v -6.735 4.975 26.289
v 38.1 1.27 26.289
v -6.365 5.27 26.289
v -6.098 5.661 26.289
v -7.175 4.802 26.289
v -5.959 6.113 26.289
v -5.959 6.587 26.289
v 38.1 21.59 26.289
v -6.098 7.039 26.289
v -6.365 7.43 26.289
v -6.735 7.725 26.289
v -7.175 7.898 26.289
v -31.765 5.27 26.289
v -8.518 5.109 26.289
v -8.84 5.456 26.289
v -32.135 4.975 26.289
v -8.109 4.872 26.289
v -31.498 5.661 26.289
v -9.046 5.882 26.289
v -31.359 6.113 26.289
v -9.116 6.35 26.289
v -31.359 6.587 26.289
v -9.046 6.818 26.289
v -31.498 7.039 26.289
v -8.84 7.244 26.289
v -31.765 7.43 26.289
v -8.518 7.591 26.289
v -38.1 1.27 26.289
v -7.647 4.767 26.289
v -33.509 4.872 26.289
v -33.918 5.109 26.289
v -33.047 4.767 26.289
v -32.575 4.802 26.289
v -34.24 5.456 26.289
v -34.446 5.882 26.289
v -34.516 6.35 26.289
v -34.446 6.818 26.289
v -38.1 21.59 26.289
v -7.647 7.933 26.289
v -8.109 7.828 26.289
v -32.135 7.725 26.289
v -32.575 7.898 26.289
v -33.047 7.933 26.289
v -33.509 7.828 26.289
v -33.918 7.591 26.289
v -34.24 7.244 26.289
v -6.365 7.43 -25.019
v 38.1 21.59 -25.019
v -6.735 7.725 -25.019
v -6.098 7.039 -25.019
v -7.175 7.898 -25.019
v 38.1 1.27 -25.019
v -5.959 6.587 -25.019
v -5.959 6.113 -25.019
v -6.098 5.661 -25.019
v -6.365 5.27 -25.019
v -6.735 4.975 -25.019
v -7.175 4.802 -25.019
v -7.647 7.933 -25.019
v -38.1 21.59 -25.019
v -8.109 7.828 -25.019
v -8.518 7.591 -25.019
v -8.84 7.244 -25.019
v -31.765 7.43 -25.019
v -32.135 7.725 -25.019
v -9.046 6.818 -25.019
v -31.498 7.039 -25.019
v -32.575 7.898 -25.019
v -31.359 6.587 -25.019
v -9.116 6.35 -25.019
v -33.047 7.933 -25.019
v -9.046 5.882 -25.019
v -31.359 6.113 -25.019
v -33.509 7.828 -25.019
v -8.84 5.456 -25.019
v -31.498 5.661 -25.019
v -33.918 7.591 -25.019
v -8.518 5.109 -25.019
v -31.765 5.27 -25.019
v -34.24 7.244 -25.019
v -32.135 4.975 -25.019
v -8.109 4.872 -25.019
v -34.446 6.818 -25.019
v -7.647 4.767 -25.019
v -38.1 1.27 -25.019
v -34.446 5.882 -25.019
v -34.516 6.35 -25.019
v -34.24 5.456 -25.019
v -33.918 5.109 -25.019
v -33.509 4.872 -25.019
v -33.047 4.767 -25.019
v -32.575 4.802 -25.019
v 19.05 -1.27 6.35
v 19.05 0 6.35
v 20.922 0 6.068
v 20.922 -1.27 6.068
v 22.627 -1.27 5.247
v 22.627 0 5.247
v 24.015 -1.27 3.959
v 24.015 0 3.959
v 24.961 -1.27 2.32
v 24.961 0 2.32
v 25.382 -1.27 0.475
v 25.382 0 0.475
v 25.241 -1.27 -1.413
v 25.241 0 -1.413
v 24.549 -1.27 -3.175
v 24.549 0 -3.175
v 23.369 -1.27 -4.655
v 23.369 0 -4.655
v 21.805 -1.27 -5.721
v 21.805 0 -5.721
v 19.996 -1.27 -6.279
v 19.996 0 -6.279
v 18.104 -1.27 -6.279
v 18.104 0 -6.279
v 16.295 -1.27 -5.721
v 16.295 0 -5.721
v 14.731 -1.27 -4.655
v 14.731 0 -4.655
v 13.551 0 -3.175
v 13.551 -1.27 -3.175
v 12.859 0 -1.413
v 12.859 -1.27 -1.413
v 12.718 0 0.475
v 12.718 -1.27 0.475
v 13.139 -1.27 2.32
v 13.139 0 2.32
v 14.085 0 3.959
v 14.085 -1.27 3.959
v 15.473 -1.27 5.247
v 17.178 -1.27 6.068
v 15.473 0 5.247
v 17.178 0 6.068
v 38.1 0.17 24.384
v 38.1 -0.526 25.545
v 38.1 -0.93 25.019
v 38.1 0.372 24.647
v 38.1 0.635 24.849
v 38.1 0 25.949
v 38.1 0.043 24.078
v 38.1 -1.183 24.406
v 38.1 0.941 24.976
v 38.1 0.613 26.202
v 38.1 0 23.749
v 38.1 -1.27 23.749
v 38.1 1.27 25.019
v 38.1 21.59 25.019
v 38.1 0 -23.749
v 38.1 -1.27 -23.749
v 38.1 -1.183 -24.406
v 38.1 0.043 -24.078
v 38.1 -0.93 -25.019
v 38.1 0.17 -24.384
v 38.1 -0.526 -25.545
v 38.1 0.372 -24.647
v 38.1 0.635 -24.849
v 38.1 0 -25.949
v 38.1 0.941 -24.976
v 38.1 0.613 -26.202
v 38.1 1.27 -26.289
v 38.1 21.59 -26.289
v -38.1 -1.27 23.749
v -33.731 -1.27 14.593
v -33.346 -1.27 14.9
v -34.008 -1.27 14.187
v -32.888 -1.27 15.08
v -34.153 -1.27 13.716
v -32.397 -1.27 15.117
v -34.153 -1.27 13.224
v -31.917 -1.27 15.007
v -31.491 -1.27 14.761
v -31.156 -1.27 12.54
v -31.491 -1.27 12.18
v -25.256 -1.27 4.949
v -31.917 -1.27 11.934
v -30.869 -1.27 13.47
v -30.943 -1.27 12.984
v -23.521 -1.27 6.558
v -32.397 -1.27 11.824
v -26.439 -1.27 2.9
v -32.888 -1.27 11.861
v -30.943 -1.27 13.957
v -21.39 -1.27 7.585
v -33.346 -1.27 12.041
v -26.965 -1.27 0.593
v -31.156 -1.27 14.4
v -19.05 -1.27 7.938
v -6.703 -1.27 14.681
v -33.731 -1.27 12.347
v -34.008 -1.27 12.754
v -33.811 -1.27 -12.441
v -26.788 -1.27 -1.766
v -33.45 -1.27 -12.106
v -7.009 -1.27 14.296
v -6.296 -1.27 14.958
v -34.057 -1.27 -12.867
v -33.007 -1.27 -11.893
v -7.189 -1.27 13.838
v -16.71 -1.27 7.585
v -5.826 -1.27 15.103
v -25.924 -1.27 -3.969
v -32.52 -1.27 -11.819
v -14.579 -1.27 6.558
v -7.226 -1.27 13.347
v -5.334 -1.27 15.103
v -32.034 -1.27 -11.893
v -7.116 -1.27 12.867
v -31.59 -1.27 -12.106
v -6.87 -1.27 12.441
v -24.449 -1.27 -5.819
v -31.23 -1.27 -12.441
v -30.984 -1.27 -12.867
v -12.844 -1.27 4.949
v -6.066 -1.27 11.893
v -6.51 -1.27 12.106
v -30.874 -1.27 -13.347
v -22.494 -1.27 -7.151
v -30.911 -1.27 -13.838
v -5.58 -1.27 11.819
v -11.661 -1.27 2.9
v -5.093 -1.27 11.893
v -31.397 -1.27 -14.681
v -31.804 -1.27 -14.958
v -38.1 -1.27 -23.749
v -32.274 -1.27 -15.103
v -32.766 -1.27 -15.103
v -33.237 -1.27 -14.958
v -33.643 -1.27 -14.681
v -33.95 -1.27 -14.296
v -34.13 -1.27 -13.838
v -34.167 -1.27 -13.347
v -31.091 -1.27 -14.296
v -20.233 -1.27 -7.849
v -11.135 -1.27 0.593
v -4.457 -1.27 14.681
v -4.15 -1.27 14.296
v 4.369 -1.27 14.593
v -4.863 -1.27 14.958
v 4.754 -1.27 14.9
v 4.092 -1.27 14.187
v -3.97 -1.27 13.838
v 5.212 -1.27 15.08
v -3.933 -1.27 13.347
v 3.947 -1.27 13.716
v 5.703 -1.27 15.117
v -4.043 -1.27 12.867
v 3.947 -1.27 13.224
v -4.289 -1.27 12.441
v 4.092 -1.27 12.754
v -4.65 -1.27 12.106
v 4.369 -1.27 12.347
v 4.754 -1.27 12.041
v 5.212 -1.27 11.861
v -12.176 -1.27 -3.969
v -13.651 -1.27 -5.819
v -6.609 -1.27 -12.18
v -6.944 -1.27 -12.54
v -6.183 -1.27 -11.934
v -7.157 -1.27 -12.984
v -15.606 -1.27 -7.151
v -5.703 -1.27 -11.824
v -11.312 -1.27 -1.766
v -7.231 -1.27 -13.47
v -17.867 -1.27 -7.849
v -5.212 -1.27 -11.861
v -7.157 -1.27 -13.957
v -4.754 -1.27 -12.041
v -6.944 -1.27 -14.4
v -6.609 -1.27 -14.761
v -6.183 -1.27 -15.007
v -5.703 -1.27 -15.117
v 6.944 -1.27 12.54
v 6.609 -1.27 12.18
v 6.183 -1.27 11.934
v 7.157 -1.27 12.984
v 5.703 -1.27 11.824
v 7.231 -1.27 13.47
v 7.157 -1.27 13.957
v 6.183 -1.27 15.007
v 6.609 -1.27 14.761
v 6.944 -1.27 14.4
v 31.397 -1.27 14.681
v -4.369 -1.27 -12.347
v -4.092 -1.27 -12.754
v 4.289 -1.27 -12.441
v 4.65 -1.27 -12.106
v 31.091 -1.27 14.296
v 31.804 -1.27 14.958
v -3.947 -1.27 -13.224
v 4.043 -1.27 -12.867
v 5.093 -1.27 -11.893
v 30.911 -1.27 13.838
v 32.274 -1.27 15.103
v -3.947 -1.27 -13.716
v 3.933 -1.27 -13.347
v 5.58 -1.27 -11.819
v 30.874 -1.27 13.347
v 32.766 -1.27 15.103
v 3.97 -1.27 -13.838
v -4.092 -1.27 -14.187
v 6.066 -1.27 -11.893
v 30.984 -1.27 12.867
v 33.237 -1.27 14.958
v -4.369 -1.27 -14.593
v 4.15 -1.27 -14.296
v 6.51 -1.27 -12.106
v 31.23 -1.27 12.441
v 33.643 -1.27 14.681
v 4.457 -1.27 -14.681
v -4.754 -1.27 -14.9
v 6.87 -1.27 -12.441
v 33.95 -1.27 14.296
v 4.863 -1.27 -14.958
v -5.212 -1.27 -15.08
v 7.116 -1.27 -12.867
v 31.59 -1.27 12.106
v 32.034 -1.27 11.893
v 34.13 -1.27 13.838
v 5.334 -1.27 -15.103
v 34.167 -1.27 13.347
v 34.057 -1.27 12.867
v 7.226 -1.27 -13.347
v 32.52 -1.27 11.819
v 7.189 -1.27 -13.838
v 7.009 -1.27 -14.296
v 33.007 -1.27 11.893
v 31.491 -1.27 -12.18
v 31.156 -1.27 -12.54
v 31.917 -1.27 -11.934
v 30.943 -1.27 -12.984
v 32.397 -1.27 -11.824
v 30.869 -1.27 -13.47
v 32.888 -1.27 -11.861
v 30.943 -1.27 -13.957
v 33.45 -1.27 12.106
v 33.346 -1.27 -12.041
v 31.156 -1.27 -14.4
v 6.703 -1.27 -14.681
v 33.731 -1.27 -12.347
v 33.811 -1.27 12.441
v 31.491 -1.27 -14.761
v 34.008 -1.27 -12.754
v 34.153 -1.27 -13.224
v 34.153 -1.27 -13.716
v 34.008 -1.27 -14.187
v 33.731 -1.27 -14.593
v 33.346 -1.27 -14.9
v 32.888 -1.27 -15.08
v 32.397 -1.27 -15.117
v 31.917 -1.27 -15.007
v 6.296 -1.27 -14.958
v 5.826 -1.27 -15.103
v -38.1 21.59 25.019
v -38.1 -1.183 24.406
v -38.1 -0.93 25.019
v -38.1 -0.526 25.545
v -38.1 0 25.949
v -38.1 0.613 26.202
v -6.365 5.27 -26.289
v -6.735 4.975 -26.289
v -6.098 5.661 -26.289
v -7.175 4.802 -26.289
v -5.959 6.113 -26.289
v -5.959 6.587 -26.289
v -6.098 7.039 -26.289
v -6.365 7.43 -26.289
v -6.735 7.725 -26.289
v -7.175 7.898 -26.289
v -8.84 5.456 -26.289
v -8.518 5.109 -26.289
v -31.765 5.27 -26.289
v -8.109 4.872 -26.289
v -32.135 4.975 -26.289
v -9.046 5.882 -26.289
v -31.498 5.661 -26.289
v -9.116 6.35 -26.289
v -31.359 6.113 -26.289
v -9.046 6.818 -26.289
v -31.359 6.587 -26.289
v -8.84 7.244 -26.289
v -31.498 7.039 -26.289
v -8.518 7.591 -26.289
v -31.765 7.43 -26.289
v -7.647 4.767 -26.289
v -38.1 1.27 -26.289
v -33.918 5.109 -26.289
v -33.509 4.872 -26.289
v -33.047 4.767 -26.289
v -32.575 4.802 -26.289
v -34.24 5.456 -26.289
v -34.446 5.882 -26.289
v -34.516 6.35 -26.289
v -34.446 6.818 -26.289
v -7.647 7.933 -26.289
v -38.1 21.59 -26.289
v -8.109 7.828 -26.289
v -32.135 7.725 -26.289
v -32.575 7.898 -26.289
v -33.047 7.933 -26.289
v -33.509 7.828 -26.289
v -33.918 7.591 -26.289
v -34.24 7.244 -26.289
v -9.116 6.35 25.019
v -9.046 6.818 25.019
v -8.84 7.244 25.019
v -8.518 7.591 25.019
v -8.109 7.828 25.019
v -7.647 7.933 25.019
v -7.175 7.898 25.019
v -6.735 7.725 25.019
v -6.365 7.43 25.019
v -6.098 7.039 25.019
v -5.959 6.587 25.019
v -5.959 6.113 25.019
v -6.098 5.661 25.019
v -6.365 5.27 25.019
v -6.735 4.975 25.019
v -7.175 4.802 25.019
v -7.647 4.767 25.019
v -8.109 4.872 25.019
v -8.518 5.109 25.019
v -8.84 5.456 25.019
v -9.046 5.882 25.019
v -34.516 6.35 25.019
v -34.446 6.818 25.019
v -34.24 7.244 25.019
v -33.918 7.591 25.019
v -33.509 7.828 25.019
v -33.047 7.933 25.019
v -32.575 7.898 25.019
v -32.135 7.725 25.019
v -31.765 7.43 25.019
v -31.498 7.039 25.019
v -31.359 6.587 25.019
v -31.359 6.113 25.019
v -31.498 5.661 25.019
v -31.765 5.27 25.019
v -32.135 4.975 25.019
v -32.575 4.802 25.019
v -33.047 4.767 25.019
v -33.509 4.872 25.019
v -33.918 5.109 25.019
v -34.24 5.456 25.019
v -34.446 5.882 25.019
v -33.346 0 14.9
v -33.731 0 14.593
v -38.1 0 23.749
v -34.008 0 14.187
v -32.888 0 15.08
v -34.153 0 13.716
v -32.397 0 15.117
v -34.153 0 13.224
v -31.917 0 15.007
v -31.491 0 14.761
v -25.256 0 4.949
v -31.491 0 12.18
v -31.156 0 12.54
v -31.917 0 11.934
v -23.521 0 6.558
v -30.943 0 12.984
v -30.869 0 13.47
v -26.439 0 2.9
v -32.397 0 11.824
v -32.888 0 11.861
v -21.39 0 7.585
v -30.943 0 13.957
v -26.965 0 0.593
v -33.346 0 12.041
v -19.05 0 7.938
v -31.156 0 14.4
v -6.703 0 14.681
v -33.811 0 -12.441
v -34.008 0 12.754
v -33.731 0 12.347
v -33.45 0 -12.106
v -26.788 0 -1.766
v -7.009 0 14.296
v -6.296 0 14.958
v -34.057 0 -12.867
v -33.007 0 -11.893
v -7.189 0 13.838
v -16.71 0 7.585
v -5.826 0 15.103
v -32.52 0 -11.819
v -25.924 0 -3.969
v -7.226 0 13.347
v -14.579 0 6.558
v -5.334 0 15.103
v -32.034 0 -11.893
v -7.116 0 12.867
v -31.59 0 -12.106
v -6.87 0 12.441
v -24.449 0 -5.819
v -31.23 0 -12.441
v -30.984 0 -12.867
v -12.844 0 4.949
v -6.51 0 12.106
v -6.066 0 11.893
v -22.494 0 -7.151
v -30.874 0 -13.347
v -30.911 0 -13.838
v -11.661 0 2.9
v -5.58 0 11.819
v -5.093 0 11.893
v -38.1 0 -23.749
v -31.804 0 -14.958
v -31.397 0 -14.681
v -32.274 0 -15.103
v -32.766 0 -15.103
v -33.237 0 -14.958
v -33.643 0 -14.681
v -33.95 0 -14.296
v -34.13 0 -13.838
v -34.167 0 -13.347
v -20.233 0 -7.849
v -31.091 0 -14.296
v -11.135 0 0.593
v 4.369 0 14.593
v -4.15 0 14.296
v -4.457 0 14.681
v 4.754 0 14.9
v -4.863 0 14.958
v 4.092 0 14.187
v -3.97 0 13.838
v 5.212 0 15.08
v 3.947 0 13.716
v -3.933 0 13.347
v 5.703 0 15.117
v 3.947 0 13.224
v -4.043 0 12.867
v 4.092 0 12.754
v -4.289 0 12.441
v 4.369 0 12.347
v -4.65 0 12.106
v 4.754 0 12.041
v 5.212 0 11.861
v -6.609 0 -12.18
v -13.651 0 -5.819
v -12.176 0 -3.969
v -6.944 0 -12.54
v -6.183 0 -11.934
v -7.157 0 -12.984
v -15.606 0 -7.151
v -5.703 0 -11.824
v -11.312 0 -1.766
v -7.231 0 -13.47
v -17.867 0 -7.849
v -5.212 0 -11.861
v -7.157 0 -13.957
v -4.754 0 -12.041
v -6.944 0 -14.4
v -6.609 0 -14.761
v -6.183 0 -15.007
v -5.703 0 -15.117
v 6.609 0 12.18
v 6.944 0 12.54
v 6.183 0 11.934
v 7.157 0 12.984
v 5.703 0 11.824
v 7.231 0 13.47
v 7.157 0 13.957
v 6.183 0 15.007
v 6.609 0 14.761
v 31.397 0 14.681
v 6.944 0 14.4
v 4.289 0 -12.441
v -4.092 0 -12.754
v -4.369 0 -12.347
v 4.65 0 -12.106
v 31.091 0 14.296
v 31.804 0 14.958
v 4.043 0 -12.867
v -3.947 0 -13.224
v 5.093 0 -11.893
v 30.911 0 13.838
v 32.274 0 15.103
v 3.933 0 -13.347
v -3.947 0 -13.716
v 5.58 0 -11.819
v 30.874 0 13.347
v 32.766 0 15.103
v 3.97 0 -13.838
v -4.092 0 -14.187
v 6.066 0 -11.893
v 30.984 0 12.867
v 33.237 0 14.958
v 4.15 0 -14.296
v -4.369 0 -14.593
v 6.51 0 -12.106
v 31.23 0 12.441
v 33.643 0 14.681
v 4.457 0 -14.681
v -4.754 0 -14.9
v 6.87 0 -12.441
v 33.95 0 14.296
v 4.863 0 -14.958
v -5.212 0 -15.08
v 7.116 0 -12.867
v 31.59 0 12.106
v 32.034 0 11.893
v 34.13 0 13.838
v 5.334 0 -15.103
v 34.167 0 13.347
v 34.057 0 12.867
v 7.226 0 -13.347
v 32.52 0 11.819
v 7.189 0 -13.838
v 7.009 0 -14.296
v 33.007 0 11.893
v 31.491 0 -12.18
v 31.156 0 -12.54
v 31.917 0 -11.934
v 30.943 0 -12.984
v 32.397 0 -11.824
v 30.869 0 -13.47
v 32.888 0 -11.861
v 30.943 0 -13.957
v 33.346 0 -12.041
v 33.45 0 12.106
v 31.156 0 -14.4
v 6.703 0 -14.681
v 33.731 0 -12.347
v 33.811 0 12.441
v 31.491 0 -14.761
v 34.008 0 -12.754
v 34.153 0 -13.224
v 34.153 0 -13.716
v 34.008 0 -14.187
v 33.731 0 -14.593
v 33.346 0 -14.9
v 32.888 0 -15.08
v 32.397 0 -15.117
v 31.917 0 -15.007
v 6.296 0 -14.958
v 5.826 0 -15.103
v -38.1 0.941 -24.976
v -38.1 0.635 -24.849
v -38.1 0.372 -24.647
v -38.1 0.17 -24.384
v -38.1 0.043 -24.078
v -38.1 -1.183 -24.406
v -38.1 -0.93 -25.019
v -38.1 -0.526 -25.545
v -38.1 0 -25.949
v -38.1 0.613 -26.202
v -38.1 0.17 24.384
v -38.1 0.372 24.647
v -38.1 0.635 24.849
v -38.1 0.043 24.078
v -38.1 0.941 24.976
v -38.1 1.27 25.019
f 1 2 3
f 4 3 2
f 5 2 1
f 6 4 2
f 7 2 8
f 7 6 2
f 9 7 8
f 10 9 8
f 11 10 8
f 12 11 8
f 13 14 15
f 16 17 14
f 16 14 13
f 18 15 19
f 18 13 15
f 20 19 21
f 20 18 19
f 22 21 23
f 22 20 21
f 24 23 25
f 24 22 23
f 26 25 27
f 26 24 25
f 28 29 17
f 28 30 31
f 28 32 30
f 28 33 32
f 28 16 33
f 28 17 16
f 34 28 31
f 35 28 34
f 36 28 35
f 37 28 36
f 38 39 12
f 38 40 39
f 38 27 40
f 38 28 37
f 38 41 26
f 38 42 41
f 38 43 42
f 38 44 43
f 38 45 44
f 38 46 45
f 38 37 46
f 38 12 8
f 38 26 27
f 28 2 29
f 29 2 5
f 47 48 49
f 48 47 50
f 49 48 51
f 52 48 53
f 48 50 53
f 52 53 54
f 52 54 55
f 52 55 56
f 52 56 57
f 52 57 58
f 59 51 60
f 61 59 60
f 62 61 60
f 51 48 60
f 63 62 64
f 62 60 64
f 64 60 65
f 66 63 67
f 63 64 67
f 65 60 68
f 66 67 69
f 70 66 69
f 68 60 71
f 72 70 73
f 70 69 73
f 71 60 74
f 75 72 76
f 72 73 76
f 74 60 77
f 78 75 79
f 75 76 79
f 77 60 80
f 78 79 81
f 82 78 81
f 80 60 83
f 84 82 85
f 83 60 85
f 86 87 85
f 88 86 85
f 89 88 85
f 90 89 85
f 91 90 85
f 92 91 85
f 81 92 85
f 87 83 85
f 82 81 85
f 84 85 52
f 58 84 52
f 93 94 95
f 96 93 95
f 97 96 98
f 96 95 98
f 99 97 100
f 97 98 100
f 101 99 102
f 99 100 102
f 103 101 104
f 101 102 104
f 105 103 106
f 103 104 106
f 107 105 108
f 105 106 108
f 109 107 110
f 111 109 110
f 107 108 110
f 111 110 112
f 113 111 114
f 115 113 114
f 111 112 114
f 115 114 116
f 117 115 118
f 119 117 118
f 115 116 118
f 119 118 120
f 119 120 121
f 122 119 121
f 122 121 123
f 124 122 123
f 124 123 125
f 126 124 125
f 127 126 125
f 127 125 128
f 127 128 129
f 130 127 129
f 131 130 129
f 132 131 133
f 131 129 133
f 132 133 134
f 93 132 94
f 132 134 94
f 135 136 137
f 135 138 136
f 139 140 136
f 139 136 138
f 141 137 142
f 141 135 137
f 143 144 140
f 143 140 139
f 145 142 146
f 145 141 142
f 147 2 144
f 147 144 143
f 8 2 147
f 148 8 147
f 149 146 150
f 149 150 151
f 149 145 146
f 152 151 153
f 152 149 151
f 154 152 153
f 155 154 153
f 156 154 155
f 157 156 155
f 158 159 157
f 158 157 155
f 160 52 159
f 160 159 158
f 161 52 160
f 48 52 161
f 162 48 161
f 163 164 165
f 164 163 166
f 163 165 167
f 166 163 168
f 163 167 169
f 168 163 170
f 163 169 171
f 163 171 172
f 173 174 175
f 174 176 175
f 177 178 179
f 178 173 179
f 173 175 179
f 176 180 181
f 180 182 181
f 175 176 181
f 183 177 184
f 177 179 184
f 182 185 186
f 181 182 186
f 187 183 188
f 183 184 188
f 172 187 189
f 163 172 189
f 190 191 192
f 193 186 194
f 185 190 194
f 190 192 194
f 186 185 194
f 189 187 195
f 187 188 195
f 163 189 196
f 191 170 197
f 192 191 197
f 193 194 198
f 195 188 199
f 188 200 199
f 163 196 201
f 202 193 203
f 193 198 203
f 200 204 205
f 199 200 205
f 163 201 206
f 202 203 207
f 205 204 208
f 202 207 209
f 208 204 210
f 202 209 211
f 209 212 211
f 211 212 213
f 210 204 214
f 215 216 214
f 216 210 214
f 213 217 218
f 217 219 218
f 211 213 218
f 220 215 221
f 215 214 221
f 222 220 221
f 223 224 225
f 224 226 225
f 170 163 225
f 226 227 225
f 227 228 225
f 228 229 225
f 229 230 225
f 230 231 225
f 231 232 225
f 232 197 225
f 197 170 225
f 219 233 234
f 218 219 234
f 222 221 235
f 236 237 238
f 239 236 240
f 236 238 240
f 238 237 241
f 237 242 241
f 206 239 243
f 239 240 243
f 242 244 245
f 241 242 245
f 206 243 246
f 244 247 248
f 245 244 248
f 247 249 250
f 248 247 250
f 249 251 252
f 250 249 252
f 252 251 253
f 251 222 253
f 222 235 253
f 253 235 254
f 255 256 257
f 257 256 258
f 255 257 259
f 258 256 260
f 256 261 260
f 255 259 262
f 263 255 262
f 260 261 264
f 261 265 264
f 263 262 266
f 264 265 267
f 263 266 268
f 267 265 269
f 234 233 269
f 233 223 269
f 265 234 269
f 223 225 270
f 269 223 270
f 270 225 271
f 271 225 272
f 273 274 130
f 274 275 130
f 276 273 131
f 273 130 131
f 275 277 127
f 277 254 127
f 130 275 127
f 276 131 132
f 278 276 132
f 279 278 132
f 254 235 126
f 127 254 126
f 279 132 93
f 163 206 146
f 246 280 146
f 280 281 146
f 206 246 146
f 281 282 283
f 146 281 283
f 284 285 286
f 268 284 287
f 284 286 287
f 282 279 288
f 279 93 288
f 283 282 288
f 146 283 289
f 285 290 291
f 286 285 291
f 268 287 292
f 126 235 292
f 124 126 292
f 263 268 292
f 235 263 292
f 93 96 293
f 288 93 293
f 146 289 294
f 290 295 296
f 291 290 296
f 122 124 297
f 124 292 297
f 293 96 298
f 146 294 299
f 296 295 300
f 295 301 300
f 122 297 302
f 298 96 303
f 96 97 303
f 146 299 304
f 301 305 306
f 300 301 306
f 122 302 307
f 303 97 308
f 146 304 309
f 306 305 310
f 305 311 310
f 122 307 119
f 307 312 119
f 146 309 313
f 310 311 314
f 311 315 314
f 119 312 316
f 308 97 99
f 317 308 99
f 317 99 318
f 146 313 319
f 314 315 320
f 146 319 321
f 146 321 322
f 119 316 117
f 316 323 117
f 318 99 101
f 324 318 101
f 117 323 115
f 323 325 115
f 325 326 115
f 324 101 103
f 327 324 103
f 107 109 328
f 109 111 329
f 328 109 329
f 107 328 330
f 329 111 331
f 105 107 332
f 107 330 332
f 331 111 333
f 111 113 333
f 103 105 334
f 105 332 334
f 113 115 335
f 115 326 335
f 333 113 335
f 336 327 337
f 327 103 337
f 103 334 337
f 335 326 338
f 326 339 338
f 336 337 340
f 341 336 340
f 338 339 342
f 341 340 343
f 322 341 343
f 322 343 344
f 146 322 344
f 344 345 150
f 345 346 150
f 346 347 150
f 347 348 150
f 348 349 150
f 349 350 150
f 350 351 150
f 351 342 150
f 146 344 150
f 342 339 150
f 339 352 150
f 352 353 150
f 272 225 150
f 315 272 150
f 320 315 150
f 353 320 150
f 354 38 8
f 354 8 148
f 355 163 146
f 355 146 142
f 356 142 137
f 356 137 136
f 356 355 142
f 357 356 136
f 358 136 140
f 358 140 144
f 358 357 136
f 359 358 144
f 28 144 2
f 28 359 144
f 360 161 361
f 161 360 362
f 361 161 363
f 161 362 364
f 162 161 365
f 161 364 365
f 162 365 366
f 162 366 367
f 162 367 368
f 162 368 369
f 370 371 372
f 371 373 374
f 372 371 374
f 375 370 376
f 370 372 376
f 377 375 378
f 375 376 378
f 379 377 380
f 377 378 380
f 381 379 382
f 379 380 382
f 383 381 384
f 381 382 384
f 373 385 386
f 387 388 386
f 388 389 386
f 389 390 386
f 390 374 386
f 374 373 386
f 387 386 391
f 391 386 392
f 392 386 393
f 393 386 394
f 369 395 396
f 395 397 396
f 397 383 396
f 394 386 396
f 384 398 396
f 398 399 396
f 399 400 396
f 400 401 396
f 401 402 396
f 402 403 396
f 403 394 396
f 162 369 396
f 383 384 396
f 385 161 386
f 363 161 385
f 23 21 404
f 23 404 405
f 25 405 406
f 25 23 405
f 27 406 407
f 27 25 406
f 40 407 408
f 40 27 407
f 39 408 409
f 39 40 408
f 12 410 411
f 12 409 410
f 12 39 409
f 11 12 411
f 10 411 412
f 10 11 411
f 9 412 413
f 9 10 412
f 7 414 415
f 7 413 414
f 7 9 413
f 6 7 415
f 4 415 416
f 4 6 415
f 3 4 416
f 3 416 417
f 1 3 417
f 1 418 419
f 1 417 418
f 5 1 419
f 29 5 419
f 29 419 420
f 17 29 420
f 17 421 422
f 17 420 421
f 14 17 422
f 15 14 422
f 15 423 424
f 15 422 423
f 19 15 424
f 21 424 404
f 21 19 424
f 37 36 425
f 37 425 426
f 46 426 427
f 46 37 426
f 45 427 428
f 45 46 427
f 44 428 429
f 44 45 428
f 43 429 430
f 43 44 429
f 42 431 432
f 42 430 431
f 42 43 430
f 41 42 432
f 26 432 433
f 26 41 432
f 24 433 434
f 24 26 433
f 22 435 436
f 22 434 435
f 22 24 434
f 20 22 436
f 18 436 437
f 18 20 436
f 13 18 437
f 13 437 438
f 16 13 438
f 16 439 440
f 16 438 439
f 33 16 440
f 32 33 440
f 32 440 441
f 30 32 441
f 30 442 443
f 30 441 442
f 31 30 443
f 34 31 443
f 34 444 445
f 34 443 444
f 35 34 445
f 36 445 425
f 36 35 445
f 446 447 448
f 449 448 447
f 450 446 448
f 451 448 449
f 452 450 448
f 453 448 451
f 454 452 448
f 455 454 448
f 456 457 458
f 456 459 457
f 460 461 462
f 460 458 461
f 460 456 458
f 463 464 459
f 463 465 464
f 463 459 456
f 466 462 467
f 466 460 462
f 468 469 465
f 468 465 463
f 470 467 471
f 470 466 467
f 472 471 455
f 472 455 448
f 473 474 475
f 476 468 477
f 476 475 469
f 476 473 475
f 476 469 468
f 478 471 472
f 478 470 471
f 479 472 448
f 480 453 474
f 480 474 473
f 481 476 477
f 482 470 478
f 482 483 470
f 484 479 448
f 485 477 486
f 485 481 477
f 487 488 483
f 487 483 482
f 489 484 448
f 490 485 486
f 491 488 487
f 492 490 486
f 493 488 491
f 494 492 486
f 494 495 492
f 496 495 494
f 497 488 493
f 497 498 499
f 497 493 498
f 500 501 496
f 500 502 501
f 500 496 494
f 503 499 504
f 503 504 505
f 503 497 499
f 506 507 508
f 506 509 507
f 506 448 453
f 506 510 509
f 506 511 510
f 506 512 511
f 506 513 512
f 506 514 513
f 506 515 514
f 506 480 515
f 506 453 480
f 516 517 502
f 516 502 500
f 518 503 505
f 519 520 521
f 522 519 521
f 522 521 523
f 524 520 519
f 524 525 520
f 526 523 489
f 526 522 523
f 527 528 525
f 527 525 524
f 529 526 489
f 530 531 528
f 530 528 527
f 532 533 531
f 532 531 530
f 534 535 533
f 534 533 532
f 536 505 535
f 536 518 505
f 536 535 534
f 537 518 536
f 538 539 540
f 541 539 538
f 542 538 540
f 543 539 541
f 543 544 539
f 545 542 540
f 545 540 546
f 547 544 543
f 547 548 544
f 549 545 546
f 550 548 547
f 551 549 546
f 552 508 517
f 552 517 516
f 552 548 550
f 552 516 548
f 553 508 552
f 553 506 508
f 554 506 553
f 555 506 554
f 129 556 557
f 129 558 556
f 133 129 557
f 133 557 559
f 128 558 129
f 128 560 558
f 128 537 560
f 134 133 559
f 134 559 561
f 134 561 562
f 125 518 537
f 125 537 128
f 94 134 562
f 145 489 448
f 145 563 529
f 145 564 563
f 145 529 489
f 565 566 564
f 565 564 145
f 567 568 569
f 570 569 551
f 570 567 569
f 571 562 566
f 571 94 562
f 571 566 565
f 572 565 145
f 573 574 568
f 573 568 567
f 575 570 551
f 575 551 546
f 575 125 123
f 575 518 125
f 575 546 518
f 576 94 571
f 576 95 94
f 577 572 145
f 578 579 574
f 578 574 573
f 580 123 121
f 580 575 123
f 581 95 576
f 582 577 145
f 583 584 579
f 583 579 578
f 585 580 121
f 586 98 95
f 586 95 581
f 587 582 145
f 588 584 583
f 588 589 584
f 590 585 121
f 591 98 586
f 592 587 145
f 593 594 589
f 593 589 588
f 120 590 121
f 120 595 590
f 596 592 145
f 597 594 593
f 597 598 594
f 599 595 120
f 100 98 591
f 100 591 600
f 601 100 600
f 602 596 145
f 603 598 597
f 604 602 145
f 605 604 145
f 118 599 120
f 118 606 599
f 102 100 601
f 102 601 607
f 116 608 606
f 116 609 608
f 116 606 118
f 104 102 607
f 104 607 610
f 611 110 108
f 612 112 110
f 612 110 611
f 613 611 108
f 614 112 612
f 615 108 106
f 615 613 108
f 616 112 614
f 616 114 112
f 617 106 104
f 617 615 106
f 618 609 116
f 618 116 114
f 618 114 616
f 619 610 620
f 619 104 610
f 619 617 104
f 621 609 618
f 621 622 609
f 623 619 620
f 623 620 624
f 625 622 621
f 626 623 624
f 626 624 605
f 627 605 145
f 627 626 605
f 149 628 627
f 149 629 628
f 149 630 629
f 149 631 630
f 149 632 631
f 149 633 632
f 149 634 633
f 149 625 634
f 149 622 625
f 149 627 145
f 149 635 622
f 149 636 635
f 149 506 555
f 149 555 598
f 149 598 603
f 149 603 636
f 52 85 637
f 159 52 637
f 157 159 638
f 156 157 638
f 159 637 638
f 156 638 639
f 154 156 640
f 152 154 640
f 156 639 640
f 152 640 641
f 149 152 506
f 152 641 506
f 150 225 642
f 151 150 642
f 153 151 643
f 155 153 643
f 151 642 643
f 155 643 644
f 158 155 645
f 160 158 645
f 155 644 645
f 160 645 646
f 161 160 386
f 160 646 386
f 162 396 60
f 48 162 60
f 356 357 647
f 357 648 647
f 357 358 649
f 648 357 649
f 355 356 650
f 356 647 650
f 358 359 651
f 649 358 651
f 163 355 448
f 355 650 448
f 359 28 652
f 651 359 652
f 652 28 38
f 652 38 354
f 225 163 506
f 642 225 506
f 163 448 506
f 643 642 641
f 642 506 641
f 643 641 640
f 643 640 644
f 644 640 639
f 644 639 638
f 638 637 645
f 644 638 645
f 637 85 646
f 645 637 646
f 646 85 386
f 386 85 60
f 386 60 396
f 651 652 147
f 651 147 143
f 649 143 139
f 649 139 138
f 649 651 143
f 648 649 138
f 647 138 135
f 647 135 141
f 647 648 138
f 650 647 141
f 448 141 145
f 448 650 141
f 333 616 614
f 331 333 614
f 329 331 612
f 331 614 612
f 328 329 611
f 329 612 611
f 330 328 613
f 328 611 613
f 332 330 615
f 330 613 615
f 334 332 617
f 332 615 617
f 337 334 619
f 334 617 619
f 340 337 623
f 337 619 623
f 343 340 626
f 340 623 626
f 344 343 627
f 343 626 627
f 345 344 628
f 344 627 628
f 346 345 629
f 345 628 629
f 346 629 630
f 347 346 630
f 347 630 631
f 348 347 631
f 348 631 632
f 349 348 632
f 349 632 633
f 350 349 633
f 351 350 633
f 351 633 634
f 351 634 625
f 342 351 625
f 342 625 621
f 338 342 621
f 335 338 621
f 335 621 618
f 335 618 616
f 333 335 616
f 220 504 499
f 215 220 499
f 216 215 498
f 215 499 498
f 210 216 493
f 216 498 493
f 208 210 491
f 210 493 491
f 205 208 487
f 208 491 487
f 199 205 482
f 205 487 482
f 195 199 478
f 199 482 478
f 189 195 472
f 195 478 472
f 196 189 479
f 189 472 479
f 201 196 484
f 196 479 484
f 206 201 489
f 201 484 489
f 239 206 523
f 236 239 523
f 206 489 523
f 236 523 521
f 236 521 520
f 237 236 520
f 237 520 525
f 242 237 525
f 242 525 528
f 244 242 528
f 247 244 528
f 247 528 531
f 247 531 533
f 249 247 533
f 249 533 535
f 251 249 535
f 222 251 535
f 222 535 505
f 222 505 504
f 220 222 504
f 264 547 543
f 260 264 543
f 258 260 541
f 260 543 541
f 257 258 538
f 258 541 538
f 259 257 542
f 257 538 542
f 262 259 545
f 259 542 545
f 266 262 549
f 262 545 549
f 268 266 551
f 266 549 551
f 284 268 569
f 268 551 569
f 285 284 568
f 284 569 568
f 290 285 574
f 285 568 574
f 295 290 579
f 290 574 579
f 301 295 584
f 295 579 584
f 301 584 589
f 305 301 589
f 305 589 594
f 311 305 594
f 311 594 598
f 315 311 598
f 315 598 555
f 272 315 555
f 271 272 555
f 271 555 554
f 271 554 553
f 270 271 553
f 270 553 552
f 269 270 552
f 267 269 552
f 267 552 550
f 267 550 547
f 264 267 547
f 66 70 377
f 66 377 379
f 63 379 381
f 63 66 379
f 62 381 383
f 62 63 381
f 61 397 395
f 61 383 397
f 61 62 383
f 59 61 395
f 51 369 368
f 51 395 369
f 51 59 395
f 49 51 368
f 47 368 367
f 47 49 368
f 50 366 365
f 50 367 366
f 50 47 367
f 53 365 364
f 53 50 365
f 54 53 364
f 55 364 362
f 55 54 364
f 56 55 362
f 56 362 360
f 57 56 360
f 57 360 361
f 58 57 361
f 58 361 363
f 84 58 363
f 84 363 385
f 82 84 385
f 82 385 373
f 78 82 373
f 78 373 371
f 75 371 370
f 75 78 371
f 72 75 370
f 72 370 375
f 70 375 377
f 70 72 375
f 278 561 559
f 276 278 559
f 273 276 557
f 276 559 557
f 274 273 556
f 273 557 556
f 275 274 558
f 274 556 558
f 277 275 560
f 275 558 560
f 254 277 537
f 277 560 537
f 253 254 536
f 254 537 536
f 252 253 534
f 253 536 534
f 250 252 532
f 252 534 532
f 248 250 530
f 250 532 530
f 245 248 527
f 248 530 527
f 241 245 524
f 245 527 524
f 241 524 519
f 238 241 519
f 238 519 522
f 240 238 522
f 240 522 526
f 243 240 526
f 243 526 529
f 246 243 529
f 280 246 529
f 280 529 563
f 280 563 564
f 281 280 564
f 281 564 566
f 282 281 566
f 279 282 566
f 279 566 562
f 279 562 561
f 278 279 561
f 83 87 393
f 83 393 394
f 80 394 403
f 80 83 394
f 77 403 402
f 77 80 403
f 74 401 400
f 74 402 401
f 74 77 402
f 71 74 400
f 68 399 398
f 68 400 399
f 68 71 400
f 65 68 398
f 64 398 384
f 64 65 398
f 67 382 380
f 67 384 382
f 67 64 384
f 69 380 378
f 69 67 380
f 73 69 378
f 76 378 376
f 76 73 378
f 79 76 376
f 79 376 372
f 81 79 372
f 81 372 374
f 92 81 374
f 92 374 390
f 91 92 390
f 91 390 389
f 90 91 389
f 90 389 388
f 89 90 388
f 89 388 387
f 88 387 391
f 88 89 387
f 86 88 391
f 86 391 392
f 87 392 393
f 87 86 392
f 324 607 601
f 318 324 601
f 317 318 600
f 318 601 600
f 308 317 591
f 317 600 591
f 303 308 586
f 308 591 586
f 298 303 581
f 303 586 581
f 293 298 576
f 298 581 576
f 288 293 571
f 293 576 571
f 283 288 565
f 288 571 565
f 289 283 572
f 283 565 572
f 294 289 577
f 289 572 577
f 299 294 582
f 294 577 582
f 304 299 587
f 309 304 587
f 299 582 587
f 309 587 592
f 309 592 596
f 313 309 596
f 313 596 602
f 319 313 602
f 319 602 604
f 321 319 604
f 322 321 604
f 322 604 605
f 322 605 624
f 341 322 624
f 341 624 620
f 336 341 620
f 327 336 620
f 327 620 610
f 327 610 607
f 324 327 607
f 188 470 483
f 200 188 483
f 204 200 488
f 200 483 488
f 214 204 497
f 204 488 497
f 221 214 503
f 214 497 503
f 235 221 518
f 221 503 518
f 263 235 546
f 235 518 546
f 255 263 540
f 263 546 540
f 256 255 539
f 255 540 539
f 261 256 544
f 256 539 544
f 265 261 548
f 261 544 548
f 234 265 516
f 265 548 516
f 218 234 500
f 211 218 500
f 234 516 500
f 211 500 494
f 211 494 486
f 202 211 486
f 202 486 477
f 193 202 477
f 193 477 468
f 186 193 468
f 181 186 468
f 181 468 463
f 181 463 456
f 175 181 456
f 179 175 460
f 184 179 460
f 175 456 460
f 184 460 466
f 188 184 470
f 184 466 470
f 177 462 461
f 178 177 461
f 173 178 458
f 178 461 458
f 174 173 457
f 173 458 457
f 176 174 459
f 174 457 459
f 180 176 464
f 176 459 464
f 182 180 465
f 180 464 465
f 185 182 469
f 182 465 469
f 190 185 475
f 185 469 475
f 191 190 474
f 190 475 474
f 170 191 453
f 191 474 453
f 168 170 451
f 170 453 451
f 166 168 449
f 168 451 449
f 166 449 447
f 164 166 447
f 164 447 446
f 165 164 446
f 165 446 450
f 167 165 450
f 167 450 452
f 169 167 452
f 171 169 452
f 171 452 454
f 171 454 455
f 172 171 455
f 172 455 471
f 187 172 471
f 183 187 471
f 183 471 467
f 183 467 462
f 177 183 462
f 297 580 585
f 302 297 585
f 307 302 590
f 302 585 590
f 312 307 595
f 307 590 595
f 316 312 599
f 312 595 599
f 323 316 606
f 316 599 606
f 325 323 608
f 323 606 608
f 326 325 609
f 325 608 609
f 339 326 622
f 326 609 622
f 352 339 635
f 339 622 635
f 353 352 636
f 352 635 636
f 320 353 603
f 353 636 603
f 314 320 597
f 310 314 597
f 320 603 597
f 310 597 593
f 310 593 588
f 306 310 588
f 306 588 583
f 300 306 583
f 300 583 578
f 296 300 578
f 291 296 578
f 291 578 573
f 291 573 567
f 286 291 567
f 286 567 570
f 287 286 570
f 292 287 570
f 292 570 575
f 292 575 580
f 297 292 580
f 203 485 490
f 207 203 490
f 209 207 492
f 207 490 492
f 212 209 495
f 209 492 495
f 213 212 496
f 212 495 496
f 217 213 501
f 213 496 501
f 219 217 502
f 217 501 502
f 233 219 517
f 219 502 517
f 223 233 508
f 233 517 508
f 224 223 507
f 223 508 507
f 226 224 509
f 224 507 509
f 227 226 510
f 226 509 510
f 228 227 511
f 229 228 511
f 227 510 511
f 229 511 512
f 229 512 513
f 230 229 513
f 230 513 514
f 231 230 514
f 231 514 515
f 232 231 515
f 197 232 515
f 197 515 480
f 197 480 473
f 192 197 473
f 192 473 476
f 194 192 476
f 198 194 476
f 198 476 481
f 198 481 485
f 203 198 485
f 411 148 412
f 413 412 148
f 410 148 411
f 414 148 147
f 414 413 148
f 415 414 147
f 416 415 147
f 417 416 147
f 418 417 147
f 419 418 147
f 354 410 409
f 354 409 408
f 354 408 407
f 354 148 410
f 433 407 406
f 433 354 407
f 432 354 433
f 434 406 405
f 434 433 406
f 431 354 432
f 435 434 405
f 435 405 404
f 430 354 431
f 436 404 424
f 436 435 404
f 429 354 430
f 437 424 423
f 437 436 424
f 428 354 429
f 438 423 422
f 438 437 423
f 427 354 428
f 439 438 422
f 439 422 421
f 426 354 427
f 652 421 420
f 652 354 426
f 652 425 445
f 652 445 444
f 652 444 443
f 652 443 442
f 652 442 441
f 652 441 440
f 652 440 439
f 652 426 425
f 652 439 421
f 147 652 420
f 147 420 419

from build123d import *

# Parameters (mm, degrees)
SKETCH1_W                    = 76.2
SKETCH1_H                    = 50.038
SKETCH1_R                    = 7.9375
BASE_FLANGE1_DEPTH           = 1.27
EDGE_FLANGE1_STRIP_W         = 7.62
EDGE_FLANGE1_STRIP_H         = 1.27
EDGE_FLANGE1_STRIP_CUT_DEPTH = 76.2
EDGE_FLANGE1_DEPTH           = 76.2
SKETCH9_R                    = 1.651
CUT_EXTRUDE3_DEPTH           = 52.076899093
CIRPATTERN2_COUNT            = 4
SKETCH11_R                   = 6.35
SKETCH11_R_2                 = 1.651
CUT_EXTRUDE4_DEPTH           = 2.54
CIRPATTERN3_COUNT            = 4
CUT_EXTRUDE2_DEPTH           = 69.426487445
CUT_EXTRUDE2_DEPTH_BACK      = 69.426487445
SKETCH10_R                   = 1.5875


# Sheet-metal steps are written as plain solids
with BuildPart() as part:
    # Sketch1 → Base-Flange1 (new body)
    with BuildSketch(Plane(origin=(0, 0, 0), x_dir=(1, 0, 0), z_dir=(0, 1, 0))):
        Rectangle(SKETCH1_W, SKETCH1_H)
        with Locations(Location((-19.05, 0, 0), (0, 0, 270))):
            Circle(SKETCH1_R, mode=Mode.SUBTRACT)
    extrude(amount=-BASE_FLANGE1_DEPTH)

    # Edge-Flange1 strip (across the edge) → Edge-Flange1 strip cut (cut)
    with BuildSketch(Plane(origin=(-38.1, 0, 25.019), x_dir=(0, 0, -1), z_dir=(1, 0, 0))):
        with Locations((-2.54, -0.635)):
            Rectangle(EDGE_FLANGE1_STRIP_W, EDGE_FLANGE1_STRIP_H)
    edge_flange1_strip_cut = extrude(amount=EDGE_FLANGE1_STRIP_CUT_DEPTH, mode=Mode.SUBTRACT)

    # Edge-Flange1 section (across the edge) → Edge-Flange1 (add)
    with BuildSketch(Plane(origin=(-38.1, 0, 25.019), x_dir=(0, 0, -1), z_dir=(1, 0, 0))):
        with BuildLine():
            Line((-1.27, 1.27), (-1.27, 21.59))
            Line((-1.27, 21.59), (0, 21.59))
            Line((0, 21.59), (0, 1.27))
            ThreePointArc((0, 1.27), (0.371974388, 0.371974388), (1.27, 0))
            Line((1.27, 0), (1.27, -1.27))
            ThreePointArc((1.27, -1.27), (-0.526051224, -0.526051224), (-1.27, 1.27))
        make_face()
    edge_flange1 = extrude(amount=EDGE_FLANGE1_DEPTH)

    # Mirror1: Edge-Flange1 strip cut, Edge-Flange1 across plane
    add(edge_flange1_strip_cut.mirror(Plane.XY), mode=Mode.SUBTRACT)
    add(edge_flange1.mirror(Plane.XY))

    # Sketch9 → Cut-Extrude3 (cut, through all)
    with BuildSketch(Plane(origin=(0, 0, 0), x_dir=(1, 0, 0), z_dir=(0, 1, 0))):
        with Locations(Location((-32.520384182, 13.470384182, 0), (0, 0, 270))):
            Circle(SKETCH9_R)
    cut_extrude3 = extrude(amount=-CUT_EXTRUDE3_DEPTH, mode=Mode.SUBTRACT)

    # CirPattern2: Cut-Extrude3 ×4 about axis
    cirpattern2_axis = Axis((-19.05, 0, 0), (0, 1, 0))
    for i in range(1, CIRPATTERN2_COUNT):
        add(cut_extrude3.rotate(cirpattern2_axis, i * 360 / CIRPATTERN2_COUNT), mode=Mode.SUBTRACT)

    # Sketch11 → Cut-Extrude4 (cut)
    with BuildSketch(Plane(origin=(0, 0, 0), x_dir=(1, 0, 0), z_dir=(0, 1, 0))):
        with Locations(Location((19.05, 0, 0), (0, 0, 270))):
            Circle(SKETCH11_R)
        with Locations(Location((5.579615818, 13.470384182, 0), (0, 0, 270))):
            Circle(SKETCH11_R_2)
    cut_extrude4 = extrude(amount=-CUT_EXTRUDE4_DEPTH, mode=Mode.SUBTRACT)

    # CirPattern3: Cut-Extrude4 ×4 about axis
    cirpattern3_axis = Axis((19.05, 0, 0), (0, 1, 0))
    for i in range(1, CIRPATTERN3_COUNT):
        add(cut_extrude4.rotate(cirpattern3_axis, i * 360 / CIRPATTERN3_COUNT), mode=Mode.SUBTRACT)

    # Sketch10 → Cut-Extrude2 (cut, two sides: drawn at the far end of the back side and taken through both)
    with BuildSketch(Plane(origin=(0, 0, -26.289), x_dir=(-1, 0, 0), z_dir=(0, 0, -1)).offset(-CUT_EXTRUDE2_DEPTH_BACK)):
        with Locations((7.52856, 6.35)):
            Circle(SKETCH10_R)
        with Locations((32.92856, 6.35)):
            Circle(SKETCH10_R)
    extrude(amount=CUT_EXTRUDE2_DEPTH + CUT_EXTRUDE2_DEPTH_BACK, mode=Mode.SUBTRACT)


solid = part.part
